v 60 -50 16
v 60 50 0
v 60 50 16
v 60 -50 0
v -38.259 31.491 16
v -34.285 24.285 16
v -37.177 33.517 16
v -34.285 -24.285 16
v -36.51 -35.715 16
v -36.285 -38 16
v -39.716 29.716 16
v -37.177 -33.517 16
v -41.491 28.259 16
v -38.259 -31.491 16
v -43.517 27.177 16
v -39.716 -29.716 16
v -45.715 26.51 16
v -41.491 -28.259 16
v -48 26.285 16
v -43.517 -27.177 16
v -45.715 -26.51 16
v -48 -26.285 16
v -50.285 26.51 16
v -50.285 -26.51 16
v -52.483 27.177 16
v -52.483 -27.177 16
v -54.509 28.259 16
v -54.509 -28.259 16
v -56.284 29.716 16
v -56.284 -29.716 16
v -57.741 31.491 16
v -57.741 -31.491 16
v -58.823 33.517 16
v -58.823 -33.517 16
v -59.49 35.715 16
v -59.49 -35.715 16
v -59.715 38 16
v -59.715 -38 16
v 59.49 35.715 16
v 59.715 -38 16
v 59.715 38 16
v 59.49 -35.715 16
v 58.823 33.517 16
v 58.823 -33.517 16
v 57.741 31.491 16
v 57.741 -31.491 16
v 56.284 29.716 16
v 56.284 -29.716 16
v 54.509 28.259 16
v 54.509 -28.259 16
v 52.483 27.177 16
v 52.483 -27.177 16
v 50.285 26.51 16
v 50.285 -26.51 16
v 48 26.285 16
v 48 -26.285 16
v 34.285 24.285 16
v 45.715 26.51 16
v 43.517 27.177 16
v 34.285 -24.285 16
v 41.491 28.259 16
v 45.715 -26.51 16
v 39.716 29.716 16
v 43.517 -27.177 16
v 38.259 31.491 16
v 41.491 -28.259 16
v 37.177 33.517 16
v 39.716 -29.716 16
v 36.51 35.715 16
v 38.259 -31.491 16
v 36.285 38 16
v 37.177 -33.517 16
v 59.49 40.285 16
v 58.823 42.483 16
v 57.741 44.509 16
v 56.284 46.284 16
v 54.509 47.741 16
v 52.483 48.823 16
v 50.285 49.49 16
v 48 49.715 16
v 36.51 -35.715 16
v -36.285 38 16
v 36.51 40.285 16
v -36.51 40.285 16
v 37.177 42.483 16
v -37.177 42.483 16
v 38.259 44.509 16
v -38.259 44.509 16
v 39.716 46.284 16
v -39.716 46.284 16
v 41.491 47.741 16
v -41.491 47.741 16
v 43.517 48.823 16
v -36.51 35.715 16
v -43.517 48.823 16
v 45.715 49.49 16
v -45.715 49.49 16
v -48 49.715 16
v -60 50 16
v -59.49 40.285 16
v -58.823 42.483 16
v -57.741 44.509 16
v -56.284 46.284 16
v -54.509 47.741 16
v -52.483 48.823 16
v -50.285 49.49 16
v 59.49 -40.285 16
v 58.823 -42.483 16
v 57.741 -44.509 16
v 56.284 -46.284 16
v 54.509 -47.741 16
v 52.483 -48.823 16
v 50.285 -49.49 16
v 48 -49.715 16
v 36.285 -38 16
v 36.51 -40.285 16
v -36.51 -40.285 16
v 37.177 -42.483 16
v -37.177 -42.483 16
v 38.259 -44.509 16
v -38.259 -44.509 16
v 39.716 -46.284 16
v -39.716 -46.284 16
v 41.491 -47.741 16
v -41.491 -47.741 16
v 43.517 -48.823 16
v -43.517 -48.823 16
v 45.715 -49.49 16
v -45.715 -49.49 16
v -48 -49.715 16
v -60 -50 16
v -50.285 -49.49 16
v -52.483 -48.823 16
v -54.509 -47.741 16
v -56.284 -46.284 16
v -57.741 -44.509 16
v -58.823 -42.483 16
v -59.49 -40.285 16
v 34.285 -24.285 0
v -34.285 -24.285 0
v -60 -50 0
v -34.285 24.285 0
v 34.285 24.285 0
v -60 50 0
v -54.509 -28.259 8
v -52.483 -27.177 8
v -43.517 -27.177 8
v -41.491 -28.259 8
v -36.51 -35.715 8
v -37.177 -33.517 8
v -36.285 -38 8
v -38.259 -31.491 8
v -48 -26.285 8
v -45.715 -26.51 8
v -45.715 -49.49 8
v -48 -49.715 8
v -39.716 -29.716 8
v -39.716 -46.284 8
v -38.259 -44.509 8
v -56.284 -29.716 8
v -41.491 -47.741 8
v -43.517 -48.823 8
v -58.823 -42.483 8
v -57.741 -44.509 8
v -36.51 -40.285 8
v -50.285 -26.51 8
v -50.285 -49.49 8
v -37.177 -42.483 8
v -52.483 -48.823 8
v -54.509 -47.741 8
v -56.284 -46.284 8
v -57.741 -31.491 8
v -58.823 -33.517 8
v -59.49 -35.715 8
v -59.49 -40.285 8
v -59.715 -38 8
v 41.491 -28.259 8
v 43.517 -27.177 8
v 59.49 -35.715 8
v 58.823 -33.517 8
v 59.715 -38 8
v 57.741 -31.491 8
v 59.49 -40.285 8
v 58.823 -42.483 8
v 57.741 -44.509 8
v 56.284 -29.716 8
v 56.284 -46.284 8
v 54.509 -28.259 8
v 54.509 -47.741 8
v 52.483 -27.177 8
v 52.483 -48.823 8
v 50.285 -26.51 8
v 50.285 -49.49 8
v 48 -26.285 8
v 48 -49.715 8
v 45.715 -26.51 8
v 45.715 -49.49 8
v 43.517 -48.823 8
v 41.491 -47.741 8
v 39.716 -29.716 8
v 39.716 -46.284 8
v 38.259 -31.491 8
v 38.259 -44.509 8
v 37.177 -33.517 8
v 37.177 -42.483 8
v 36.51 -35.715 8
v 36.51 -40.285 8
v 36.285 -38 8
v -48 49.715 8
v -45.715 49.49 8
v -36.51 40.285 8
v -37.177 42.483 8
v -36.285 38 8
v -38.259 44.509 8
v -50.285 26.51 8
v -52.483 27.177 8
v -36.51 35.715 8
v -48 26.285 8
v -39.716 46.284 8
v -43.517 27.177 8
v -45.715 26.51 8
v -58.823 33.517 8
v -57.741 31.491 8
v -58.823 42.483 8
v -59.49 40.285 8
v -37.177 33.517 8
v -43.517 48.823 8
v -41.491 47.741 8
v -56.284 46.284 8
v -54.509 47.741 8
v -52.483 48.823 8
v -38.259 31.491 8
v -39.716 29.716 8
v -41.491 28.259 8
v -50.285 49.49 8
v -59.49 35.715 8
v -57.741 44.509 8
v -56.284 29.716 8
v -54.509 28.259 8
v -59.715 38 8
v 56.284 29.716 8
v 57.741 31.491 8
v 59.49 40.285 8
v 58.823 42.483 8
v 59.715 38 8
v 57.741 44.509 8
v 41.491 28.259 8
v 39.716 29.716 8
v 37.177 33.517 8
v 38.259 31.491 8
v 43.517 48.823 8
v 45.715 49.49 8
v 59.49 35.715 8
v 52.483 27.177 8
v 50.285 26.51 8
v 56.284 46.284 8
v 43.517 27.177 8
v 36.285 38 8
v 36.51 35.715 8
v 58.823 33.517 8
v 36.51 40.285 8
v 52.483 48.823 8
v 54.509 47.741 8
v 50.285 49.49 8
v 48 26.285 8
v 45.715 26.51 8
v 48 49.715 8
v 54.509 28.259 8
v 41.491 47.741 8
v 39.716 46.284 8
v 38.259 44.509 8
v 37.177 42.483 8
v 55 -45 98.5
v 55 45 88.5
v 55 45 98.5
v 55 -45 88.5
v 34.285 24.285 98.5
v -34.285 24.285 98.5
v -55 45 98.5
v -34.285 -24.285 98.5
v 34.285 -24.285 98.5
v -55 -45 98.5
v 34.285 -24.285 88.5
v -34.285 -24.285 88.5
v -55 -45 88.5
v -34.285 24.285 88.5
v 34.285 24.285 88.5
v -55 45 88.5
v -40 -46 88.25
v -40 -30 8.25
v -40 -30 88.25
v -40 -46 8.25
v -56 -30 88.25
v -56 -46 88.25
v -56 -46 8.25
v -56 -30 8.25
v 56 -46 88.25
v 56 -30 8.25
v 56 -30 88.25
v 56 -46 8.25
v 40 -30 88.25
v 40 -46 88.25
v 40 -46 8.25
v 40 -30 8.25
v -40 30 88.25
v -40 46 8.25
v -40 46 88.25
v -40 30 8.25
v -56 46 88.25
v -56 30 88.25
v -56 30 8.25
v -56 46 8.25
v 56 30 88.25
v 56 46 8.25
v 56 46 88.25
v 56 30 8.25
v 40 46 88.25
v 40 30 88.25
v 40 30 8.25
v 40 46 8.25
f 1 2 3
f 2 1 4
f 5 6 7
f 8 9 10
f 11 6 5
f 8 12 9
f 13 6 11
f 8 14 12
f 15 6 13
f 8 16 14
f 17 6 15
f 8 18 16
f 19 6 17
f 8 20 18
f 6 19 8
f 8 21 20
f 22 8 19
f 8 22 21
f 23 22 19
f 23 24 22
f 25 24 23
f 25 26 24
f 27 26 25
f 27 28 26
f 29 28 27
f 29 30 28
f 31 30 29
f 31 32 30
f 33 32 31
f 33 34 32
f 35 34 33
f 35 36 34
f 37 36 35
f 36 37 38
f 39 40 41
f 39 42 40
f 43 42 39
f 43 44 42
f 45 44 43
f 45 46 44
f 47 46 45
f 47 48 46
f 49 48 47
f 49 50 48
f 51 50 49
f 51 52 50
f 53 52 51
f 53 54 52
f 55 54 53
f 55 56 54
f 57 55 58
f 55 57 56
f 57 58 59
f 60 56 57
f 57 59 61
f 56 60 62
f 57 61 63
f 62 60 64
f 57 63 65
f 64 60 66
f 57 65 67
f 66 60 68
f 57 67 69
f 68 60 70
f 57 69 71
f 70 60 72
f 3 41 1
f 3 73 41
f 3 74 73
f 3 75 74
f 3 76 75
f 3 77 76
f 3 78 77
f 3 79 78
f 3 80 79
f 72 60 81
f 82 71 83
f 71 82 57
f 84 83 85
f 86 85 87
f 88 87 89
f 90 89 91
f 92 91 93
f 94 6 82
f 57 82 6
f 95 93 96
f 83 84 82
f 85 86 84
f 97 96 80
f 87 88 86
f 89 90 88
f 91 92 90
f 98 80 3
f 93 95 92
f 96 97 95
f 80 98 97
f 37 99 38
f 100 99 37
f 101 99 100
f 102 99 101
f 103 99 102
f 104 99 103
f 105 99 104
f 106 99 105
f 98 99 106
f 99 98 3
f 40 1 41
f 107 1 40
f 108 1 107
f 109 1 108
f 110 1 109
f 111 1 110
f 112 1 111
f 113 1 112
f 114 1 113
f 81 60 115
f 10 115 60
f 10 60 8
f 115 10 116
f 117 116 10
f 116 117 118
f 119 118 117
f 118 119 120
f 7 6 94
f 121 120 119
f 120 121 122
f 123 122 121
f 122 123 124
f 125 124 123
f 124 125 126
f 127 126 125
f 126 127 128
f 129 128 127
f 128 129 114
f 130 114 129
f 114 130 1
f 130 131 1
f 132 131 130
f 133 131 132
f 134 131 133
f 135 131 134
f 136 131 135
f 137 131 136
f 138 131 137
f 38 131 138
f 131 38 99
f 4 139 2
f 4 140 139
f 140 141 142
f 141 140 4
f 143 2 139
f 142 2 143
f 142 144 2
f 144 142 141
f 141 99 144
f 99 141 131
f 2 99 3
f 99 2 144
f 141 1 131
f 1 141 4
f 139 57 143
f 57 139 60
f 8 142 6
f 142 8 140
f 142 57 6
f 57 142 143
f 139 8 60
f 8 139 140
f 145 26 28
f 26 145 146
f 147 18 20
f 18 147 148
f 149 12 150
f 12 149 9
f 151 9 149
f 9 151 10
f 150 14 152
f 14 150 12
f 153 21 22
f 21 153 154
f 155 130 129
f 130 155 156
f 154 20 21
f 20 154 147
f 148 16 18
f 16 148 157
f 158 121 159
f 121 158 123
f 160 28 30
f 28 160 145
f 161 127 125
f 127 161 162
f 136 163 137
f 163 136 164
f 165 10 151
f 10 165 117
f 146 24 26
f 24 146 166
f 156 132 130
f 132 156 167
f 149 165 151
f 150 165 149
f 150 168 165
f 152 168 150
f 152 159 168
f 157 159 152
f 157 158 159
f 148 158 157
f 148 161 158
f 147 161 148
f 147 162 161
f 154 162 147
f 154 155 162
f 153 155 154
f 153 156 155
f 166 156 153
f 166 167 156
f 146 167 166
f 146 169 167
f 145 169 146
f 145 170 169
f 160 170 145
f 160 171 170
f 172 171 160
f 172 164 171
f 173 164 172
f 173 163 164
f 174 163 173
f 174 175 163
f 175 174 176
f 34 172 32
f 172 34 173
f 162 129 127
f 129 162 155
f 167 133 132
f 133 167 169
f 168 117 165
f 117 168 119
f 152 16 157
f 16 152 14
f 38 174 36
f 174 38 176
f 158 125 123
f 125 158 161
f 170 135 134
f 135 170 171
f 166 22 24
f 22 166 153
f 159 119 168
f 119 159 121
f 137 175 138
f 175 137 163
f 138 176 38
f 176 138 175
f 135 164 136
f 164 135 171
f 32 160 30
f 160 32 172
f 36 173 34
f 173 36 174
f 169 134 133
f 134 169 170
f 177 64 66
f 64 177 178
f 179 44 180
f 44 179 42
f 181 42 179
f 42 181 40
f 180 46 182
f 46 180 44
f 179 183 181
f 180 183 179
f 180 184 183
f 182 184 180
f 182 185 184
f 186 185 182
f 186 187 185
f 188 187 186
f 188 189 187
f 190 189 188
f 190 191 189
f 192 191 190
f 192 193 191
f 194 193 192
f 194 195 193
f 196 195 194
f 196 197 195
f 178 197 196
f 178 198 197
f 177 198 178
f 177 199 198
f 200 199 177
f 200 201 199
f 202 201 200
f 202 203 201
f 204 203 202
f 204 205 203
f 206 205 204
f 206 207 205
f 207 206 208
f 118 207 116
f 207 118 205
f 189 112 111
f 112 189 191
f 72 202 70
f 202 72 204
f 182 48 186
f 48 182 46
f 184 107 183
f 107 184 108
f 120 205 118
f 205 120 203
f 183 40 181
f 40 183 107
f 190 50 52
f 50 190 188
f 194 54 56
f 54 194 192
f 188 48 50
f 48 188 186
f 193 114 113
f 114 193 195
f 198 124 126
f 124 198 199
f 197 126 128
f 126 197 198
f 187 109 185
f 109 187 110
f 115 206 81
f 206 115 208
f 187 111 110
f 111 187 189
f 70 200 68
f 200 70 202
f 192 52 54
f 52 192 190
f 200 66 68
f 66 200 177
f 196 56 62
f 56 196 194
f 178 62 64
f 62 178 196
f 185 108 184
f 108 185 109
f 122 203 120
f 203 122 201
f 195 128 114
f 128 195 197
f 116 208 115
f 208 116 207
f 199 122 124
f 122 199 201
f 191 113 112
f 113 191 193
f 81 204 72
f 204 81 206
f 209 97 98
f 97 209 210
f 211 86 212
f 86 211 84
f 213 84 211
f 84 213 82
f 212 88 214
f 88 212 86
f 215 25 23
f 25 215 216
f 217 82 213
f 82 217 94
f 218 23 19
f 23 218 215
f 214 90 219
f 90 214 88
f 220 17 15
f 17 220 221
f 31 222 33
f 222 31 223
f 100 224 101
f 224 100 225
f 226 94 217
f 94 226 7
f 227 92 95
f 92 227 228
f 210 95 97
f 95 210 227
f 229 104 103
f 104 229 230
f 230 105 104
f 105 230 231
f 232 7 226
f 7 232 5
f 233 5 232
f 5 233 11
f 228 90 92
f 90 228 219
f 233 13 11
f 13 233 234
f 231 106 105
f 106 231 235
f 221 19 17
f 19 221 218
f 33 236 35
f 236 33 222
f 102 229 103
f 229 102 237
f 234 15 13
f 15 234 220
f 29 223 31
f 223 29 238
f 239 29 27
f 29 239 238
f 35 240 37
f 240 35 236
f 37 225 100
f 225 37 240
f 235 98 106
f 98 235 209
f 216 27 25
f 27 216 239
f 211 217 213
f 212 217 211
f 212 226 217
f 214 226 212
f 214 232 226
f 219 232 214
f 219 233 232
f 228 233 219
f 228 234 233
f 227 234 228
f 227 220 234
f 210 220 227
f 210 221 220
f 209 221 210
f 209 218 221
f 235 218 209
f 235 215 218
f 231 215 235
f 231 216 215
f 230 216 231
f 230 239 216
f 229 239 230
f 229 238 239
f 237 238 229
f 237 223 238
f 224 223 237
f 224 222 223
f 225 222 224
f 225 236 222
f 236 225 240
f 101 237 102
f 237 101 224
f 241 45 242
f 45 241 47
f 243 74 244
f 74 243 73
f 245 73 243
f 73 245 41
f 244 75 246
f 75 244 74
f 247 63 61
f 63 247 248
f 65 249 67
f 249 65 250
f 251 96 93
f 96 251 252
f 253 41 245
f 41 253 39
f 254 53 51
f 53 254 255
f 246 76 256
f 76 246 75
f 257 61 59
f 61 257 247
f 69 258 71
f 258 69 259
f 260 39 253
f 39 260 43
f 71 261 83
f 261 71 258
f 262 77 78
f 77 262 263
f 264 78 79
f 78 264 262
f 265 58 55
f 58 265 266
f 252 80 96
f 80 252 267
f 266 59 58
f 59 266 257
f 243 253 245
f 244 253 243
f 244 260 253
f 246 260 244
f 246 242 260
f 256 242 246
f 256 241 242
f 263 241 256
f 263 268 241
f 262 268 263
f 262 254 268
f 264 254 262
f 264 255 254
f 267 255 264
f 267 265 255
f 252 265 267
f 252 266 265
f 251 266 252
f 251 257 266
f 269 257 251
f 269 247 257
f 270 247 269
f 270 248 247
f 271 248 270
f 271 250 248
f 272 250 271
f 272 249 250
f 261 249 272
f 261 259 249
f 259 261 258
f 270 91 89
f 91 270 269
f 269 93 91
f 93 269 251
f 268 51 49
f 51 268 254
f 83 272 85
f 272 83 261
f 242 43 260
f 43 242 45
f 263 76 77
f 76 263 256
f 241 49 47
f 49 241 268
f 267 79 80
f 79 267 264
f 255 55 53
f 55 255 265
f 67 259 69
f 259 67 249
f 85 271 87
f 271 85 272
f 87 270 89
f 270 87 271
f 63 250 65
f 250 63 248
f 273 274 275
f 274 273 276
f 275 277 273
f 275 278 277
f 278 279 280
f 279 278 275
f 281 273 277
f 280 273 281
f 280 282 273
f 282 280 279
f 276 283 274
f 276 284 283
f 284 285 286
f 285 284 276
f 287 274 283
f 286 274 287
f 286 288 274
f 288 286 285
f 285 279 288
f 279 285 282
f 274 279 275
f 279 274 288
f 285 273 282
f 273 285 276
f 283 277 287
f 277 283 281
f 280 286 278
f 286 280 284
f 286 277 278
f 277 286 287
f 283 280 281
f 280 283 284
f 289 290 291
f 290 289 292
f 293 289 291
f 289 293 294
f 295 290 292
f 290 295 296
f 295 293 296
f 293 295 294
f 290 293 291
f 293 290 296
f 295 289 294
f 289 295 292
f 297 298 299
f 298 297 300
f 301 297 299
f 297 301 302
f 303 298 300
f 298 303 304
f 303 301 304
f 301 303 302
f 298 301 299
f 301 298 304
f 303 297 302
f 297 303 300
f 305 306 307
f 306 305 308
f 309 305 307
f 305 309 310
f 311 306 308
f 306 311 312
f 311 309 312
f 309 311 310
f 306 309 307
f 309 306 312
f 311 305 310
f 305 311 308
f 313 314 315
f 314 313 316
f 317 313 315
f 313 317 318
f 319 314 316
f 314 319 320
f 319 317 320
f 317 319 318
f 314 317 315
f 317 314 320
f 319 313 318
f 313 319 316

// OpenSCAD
$fn = 32;

// ------------------------------------------------------------------------
// Frame cube: base 120 x 100 mm, posts 80 mm tall
// Every part is its own module, assembly() places every instance.
// ------------------------------------------------------------------------

// --- part 1 ---
module base_frame() {
  difference() {
    translate([-60, -50, 0]) cube([120, 100, 16]);
    translate([-34.285, -24.285, -1]) cube([68.57, 48.57, 18]);
    translate([-48, -38, 8]) cylinder(h = 9, d = 23.43);
    translate([48, -38, 8]) cylinder(h = 9, d = 23.43);
    translate([-48, 38, 8]) cylinder(h = 9, d = 23.43);
    translate([48, 38, 8]) cylinder(h = 9, d = 23.43);
  }
}

// --- part 2 ---
module corner_post() {
  translate([-8, -8, 0]) cube([16, 16, 80]);
}

// --- part 3 ---
module top_frame() {
  difference() {
    translate([-55, -45, 0]) cube([110, 90, 10]);
    translate([-34.285, -24.285, -1]) cube([68.57, 48.57, 12]);
  }
}

// --- assembly ---
module assembly() {
  color([0.80, 0.24, 0.20]) translate([0, 0, 0]) rotate([0, 0, 0]) base_frame();
  color([0.20, 0.45, 0.75]) translate([-48, -38, 8.25]) rotate([0, 0, 0]) corner_post();
  color([0.25, 0.62, 0.32]) translate([48, -38, 8.25]) rotate([0, 0, 0]) corner_post();
  color([0.92, 0.70, 0.18]) translate([-48, 38, 8.25]) rotate([0, 0, 0]) corner_post();
  color([0.58, 0.35, 0.70]) translate([48, 38, 8.25]) rotate([0, 0, 0]) corner_post();
  color([0.16, 0.66, 0.66]) translate([0, 0, 88.5]) rotate([0, 0, 0]) top_frame();
}

assembly();
